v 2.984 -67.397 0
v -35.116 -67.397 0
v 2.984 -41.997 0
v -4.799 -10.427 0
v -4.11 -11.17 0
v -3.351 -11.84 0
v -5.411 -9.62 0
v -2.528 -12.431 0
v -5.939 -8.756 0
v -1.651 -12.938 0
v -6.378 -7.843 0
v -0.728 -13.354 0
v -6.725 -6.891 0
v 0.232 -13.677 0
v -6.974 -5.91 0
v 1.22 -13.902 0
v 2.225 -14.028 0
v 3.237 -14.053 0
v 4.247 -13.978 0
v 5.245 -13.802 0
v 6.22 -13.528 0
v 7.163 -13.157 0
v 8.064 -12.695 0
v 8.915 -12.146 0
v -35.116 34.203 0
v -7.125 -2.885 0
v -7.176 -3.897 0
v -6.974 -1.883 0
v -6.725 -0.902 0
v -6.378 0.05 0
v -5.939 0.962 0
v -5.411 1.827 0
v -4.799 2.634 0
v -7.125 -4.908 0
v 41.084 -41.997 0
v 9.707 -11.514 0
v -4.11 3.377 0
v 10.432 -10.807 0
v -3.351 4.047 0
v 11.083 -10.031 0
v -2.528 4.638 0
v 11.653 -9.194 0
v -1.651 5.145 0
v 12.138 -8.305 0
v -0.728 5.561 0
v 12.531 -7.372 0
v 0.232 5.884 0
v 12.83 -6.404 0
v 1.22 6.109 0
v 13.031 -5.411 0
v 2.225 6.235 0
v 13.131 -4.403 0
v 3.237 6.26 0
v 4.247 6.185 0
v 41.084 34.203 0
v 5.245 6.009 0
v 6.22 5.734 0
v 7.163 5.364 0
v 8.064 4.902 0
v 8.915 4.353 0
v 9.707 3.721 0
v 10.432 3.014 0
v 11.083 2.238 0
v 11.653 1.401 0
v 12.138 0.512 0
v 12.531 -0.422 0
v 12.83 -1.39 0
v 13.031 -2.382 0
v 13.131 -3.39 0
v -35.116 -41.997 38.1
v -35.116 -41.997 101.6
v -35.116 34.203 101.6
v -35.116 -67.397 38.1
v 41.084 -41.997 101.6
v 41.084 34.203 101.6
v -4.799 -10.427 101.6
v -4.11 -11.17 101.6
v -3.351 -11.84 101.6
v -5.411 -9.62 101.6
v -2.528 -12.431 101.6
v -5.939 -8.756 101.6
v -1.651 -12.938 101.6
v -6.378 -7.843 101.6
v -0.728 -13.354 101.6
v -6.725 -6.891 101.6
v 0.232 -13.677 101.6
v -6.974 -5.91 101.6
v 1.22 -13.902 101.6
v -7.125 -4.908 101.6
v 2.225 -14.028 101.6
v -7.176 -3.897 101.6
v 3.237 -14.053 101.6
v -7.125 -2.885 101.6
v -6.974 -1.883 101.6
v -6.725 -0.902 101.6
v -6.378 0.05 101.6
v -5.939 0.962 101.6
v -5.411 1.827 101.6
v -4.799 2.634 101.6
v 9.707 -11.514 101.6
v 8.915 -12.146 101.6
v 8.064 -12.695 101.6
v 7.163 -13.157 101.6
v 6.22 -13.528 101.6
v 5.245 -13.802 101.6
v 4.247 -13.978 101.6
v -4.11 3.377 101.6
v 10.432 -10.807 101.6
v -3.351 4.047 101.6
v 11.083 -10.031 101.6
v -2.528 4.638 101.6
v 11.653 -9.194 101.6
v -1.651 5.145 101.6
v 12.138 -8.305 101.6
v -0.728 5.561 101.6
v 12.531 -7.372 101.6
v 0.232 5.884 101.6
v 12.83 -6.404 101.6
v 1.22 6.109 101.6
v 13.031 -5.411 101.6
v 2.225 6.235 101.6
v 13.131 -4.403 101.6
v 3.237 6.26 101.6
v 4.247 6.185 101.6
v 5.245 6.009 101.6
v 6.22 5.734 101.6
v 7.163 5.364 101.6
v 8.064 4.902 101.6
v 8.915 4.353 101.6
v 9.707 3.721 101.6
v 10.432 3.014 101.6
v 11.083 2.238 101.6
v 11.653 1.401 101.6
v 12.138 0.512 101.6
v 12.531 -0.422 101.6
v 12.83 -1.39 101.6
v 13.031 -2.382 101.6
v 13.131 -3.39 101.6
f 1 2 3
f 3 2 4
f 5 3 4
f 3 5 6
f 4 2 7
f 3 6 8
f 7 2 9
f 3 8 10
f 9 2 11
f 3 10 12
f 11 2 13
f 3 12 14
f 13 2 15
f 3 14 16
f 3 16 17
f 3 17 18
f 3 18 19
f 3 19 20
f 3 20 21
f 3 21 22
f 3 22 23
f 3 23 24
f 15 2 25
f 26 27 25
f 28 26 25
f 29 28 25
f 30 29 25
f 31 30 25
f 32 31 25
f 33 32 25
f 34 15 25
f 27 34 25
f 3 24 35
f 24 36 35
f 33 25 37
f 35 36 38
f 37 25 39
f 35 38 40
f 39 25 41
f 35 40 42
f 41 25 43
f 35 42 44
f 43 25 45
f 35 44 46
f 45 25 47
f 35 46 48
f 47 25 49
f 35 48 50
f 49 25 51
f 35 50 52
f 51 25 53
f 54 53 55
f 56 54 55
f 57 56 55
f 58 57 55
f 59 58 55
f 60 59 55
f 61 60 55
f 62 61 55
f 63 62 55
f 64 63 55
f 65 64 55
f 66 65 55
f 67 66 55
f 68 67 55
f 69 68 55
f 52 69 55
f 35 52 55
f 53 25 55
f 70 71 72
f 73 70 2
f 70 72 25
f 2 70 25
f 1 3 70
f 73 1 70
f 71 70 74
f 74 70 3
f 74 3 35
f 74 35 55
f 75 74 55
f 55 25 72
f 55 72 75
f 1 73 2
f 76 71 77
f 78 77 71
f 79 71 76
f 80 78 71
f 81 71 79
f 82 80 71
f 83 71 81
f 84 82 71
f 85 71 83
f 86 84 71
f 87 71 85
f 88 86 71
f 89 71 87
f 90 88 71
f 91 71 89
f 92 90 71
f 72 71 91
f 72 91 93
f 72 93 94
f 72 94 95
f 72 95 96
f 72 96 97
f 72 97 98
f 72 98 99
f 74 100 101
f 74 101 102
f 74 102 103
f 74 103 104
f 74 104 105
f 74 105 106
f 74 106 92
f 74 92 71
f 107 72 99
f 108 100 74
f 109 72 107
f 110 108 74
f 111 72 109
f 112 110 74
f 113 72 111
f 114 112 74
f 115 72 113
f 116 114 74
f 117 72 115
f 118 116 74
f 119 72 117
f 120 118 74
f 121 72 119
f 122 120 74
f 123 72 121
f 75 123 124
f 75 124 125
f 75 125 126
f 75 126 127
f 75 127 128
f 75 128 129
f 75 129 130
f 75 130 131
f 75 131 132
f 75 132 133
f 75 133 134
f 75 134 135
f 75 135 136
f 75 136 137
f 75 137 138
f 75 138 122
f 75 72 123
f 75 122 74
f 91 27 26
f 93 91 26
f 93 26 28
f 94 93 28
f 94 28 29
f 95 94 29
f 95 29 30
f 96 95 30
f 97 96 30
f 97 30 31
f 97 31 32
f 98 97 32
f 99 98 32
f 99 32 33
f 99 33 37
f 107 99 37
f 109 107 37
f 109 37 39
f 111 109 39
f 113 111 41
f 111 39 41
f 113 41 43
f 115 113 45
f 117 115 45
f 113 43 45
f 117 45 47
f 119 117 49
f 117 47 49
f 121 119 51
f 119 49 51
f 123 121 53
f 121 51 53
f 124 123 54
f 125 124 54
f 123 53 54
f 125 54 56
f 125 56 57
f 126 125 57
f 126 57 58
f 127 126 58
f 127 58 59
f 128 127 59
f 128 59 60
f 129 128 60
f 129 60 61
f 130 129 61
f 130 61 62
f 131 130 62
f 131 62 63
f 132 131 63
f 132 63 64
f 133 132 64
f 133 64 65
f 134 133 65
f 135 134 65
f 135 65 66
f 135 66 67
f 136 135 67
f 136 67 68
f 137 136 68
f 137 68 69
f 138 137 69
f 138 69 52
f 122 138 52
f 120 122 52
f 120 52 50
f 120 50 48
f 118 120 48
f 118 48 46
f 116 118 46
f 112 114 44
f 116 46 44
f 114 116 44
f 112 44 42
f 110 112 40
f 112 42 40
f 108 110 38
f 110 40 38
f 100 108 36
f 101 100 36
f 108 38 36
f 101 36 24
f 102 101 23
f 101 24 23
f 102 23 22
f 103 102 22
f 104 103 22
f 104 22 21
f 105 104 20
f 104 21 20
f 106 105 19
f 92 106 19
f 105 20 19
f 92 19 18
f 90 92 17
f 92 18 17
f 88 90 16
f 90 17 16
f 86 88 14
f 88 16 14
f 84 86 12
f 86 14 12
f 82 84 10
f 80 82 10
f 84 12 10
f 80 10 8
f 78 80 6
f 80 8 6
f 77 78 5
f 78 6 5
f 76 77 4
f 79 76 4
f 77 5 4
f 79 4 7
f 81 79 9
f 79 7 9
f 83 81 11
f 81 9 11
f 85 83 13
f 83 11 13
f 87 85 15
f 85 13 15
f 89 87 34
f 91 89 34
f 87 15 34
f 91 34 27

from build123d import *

# Parameters (mm, degrees)
F0_W     = 76.2
F0_H     = 76.2
F1_DEPTH = 101.6
F3_DEPTH = 25.4
F5_D     = 20.32


with BuildPart() as f1:
    # F0 (on Top) → F1 (new body)
    with BuildSketch(Plane.XY):
        with Locations((2.984056, -3.896592)):
            Rectangle(F0_W, F0_H)
    extrude(amount=F1_DEPTH)

    # F2 (on face) → F3 (join)
    with BuildSketch(Plane.XZ.offset(41.996592)):
        Polygon((-35.115944, 38.1), (-35.115944, 0), (2.984056, 0), align=None)
    extrude(amount=F3_DEPTH)

    # F5 (through all)
    with Locations(Plane.XY.offset(101.6)):
        with Locations((2.984056, -3.896592)):
            Hole(F5_D / 2)


solid = f1.part
